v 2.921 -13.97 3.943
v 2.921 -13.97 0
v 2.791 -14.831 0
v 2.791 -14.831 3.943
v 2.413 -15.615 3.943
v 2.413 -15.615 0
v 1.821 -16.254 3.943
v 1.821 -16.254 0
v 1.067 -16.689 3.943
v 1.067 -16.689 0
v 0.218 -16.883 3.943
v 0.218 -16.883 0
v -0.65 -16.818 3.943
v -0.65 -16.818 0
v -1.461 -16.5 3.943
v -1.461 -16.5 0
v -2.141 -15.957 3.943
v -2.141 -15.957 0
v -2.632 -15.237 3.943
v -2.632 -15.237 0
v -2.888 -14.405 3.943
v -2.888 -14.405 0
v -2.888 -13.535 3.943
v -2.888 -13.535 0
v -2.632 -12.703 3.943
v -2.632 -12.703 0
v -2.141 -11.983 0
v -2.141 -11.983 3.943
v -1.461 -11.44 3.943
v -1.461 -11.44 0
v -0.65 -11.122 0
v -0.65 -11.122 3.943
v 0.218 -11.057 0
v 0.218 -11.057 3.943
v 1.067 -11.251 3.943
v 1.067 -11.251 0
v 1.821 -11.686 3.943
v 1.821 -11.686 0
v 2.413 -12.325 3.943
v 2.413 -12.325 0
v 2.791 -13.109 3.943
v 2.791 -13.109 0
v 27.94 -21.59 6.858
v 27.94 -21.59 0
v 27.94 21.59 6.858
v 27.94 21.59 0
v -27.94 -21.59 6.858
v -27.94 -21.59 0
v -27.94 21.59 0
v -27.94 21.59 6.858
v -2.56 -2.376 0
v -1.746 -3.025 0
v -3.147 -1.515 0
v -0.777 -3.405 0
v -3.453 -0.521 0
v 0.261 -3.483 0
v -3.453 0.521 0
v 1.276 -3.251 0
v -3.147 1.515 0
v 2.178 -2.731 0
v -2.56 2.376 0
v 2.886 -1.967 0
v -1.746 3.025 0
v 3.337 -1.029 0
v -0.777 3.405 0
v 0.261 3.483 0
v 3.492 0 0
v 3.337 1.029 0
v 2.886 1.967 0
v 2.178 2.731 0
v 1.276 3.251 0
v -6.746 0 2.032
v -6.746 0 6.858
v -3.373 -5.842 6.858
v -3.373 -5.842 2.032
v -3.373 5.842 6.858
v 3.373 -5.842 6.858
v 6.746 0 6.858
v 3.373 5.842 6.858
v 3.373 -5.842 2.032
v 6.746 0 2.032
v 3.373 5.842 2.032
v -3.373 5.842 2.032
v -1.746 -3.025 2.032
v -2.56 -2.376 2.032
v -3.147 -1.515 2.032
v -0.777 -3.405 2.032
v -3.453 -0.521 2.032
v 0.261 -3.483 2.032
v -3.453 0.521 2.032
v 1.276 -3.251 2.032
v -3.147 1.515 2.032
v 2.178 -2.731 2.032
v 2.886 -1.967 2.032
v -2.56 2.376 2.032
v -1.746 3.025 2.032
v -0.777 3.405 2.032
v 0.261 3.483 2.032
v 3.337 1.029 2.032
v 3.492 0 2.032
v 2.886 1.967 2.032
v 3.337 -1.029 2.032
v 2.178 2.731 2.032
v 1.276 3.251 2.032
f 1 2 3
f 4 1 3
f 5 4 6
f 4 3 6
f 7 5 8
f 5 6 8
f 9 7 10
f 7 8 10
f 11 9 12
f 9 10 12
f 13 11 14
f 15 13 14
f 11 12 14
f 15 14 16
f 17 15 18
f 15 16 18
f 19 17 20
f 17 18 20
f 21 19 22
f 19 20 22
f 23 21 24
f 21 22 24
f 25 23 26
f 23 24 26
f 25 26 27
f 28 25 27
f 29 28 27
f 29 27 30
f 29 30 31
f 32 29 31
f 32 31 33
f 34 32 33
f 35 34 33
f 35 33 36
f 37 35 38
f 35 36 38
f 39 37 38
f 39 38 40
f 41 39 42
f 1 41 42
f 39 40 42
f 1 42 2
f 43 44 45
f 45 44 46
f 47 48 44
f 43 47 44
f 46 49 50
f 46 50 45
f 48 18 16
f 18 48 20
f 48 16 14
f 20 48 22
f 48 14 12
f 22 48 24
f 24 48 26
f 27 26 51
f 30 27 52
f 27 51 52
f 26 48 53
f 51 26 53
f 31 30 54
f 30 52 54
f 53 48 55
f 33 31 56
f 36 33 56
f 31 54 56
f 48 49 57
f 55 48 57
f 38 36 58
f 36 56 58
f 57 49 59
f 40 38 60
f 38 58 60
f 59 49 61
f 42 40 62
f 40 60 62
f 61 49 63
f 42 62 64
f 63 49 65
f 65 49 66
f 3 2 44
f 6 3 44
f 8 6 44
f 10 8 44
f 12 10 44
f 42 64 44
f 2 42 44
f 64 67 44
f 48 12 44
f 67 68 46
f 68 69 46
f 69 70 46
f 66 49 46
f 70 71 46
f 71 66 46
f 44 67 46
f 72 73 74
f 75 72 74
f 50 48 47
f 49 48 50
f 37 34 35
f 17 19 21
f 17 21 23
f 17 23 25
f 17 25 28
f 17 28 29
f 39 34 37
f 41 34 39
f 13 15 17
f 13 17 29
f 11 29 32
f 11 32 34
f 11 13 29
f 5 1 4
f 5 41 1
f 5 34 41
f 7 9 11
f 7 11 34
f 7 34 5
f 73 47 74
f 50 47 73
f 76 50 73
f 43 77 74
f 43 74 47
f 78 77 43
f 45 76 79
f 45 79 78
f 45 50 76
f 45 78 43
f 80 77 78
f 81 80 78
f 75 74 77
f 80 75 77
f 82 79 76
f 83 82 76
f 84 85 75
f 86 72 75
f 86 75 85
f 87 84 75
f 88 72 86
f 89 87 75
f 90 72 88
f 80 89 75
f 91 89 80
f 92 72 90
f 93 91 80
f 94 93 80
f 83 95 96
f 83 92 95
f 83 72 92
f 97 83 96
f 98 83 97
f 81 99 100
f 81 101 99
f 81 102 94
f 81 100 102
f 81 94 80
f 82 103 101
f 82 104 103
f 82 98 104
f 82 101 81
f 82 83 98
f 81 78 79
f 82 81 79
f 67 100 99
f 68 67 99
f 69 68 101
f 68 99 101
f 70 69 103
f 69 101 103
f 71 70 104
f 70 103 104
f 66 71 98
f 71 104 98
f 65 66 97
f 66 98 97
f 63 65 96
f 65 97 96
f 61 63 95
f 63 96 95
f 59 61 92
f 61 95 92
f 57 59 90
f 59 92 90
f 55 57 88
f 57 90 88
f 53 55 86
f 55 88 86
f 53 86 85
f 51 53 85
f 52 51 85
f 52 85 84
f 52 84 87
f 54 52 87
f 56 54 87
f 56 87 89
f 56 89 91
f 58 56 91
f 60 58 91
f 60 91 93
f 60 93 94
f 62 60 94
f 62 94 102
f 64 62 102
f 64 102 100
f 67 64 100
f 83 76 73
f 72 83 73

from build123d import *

# Parameters (mm, degrees)
F0_W     = 55.88
F0_H     = 43.18
F1_DEPTH = 6.858
F3_R     = 2.921
F4_DEPTH = 3.94335
F5_DEPTH = 4.826
F6_R     = 3.4925
F7_DEPTH = 25.4


with BuildPart() as f1:
    # F0 (on Top) → F1 (new body)
    with BuildSketch(Plane.XY):
        Rectangle(F0_W, F0_H)
    extrude(amount=F1_DEPTH)

    # F3 (on face) → F4 (cut)
    with BuildSketch(Plane(origin=(0, 0, 0), x_dir=(1, 0, 0), z_dir=(0, 0, -1))):
        with Locations((0, 13.97)):
            Circle(F3_R)
    extrude(amount=-F4_DEPTH, mode=Mode.SUBTRACT)

    # F2 (on face) → F5 (cut)
    with BuildSketch(Plane.XY.offset(6.858)):
        Polygon((3.37288, -5.842), (6.745761, 0), (3.37288, 5.842), (-3.37288, 5.842), (-6.745761, 0), (-3.37288, -5.842), align=None)
    extrude(amount=-F5_DEPTH, mode=Mode.SUBTRACT)

    # F6 (on face) → F7 (cut)
    with BuildSketch(Plane.XY.offset(2.032)):
        Circle(F6_R)
    extrude(amount=-F7_DEPTH, mode=Mode.SUBTRACT)


solid = f1.part
